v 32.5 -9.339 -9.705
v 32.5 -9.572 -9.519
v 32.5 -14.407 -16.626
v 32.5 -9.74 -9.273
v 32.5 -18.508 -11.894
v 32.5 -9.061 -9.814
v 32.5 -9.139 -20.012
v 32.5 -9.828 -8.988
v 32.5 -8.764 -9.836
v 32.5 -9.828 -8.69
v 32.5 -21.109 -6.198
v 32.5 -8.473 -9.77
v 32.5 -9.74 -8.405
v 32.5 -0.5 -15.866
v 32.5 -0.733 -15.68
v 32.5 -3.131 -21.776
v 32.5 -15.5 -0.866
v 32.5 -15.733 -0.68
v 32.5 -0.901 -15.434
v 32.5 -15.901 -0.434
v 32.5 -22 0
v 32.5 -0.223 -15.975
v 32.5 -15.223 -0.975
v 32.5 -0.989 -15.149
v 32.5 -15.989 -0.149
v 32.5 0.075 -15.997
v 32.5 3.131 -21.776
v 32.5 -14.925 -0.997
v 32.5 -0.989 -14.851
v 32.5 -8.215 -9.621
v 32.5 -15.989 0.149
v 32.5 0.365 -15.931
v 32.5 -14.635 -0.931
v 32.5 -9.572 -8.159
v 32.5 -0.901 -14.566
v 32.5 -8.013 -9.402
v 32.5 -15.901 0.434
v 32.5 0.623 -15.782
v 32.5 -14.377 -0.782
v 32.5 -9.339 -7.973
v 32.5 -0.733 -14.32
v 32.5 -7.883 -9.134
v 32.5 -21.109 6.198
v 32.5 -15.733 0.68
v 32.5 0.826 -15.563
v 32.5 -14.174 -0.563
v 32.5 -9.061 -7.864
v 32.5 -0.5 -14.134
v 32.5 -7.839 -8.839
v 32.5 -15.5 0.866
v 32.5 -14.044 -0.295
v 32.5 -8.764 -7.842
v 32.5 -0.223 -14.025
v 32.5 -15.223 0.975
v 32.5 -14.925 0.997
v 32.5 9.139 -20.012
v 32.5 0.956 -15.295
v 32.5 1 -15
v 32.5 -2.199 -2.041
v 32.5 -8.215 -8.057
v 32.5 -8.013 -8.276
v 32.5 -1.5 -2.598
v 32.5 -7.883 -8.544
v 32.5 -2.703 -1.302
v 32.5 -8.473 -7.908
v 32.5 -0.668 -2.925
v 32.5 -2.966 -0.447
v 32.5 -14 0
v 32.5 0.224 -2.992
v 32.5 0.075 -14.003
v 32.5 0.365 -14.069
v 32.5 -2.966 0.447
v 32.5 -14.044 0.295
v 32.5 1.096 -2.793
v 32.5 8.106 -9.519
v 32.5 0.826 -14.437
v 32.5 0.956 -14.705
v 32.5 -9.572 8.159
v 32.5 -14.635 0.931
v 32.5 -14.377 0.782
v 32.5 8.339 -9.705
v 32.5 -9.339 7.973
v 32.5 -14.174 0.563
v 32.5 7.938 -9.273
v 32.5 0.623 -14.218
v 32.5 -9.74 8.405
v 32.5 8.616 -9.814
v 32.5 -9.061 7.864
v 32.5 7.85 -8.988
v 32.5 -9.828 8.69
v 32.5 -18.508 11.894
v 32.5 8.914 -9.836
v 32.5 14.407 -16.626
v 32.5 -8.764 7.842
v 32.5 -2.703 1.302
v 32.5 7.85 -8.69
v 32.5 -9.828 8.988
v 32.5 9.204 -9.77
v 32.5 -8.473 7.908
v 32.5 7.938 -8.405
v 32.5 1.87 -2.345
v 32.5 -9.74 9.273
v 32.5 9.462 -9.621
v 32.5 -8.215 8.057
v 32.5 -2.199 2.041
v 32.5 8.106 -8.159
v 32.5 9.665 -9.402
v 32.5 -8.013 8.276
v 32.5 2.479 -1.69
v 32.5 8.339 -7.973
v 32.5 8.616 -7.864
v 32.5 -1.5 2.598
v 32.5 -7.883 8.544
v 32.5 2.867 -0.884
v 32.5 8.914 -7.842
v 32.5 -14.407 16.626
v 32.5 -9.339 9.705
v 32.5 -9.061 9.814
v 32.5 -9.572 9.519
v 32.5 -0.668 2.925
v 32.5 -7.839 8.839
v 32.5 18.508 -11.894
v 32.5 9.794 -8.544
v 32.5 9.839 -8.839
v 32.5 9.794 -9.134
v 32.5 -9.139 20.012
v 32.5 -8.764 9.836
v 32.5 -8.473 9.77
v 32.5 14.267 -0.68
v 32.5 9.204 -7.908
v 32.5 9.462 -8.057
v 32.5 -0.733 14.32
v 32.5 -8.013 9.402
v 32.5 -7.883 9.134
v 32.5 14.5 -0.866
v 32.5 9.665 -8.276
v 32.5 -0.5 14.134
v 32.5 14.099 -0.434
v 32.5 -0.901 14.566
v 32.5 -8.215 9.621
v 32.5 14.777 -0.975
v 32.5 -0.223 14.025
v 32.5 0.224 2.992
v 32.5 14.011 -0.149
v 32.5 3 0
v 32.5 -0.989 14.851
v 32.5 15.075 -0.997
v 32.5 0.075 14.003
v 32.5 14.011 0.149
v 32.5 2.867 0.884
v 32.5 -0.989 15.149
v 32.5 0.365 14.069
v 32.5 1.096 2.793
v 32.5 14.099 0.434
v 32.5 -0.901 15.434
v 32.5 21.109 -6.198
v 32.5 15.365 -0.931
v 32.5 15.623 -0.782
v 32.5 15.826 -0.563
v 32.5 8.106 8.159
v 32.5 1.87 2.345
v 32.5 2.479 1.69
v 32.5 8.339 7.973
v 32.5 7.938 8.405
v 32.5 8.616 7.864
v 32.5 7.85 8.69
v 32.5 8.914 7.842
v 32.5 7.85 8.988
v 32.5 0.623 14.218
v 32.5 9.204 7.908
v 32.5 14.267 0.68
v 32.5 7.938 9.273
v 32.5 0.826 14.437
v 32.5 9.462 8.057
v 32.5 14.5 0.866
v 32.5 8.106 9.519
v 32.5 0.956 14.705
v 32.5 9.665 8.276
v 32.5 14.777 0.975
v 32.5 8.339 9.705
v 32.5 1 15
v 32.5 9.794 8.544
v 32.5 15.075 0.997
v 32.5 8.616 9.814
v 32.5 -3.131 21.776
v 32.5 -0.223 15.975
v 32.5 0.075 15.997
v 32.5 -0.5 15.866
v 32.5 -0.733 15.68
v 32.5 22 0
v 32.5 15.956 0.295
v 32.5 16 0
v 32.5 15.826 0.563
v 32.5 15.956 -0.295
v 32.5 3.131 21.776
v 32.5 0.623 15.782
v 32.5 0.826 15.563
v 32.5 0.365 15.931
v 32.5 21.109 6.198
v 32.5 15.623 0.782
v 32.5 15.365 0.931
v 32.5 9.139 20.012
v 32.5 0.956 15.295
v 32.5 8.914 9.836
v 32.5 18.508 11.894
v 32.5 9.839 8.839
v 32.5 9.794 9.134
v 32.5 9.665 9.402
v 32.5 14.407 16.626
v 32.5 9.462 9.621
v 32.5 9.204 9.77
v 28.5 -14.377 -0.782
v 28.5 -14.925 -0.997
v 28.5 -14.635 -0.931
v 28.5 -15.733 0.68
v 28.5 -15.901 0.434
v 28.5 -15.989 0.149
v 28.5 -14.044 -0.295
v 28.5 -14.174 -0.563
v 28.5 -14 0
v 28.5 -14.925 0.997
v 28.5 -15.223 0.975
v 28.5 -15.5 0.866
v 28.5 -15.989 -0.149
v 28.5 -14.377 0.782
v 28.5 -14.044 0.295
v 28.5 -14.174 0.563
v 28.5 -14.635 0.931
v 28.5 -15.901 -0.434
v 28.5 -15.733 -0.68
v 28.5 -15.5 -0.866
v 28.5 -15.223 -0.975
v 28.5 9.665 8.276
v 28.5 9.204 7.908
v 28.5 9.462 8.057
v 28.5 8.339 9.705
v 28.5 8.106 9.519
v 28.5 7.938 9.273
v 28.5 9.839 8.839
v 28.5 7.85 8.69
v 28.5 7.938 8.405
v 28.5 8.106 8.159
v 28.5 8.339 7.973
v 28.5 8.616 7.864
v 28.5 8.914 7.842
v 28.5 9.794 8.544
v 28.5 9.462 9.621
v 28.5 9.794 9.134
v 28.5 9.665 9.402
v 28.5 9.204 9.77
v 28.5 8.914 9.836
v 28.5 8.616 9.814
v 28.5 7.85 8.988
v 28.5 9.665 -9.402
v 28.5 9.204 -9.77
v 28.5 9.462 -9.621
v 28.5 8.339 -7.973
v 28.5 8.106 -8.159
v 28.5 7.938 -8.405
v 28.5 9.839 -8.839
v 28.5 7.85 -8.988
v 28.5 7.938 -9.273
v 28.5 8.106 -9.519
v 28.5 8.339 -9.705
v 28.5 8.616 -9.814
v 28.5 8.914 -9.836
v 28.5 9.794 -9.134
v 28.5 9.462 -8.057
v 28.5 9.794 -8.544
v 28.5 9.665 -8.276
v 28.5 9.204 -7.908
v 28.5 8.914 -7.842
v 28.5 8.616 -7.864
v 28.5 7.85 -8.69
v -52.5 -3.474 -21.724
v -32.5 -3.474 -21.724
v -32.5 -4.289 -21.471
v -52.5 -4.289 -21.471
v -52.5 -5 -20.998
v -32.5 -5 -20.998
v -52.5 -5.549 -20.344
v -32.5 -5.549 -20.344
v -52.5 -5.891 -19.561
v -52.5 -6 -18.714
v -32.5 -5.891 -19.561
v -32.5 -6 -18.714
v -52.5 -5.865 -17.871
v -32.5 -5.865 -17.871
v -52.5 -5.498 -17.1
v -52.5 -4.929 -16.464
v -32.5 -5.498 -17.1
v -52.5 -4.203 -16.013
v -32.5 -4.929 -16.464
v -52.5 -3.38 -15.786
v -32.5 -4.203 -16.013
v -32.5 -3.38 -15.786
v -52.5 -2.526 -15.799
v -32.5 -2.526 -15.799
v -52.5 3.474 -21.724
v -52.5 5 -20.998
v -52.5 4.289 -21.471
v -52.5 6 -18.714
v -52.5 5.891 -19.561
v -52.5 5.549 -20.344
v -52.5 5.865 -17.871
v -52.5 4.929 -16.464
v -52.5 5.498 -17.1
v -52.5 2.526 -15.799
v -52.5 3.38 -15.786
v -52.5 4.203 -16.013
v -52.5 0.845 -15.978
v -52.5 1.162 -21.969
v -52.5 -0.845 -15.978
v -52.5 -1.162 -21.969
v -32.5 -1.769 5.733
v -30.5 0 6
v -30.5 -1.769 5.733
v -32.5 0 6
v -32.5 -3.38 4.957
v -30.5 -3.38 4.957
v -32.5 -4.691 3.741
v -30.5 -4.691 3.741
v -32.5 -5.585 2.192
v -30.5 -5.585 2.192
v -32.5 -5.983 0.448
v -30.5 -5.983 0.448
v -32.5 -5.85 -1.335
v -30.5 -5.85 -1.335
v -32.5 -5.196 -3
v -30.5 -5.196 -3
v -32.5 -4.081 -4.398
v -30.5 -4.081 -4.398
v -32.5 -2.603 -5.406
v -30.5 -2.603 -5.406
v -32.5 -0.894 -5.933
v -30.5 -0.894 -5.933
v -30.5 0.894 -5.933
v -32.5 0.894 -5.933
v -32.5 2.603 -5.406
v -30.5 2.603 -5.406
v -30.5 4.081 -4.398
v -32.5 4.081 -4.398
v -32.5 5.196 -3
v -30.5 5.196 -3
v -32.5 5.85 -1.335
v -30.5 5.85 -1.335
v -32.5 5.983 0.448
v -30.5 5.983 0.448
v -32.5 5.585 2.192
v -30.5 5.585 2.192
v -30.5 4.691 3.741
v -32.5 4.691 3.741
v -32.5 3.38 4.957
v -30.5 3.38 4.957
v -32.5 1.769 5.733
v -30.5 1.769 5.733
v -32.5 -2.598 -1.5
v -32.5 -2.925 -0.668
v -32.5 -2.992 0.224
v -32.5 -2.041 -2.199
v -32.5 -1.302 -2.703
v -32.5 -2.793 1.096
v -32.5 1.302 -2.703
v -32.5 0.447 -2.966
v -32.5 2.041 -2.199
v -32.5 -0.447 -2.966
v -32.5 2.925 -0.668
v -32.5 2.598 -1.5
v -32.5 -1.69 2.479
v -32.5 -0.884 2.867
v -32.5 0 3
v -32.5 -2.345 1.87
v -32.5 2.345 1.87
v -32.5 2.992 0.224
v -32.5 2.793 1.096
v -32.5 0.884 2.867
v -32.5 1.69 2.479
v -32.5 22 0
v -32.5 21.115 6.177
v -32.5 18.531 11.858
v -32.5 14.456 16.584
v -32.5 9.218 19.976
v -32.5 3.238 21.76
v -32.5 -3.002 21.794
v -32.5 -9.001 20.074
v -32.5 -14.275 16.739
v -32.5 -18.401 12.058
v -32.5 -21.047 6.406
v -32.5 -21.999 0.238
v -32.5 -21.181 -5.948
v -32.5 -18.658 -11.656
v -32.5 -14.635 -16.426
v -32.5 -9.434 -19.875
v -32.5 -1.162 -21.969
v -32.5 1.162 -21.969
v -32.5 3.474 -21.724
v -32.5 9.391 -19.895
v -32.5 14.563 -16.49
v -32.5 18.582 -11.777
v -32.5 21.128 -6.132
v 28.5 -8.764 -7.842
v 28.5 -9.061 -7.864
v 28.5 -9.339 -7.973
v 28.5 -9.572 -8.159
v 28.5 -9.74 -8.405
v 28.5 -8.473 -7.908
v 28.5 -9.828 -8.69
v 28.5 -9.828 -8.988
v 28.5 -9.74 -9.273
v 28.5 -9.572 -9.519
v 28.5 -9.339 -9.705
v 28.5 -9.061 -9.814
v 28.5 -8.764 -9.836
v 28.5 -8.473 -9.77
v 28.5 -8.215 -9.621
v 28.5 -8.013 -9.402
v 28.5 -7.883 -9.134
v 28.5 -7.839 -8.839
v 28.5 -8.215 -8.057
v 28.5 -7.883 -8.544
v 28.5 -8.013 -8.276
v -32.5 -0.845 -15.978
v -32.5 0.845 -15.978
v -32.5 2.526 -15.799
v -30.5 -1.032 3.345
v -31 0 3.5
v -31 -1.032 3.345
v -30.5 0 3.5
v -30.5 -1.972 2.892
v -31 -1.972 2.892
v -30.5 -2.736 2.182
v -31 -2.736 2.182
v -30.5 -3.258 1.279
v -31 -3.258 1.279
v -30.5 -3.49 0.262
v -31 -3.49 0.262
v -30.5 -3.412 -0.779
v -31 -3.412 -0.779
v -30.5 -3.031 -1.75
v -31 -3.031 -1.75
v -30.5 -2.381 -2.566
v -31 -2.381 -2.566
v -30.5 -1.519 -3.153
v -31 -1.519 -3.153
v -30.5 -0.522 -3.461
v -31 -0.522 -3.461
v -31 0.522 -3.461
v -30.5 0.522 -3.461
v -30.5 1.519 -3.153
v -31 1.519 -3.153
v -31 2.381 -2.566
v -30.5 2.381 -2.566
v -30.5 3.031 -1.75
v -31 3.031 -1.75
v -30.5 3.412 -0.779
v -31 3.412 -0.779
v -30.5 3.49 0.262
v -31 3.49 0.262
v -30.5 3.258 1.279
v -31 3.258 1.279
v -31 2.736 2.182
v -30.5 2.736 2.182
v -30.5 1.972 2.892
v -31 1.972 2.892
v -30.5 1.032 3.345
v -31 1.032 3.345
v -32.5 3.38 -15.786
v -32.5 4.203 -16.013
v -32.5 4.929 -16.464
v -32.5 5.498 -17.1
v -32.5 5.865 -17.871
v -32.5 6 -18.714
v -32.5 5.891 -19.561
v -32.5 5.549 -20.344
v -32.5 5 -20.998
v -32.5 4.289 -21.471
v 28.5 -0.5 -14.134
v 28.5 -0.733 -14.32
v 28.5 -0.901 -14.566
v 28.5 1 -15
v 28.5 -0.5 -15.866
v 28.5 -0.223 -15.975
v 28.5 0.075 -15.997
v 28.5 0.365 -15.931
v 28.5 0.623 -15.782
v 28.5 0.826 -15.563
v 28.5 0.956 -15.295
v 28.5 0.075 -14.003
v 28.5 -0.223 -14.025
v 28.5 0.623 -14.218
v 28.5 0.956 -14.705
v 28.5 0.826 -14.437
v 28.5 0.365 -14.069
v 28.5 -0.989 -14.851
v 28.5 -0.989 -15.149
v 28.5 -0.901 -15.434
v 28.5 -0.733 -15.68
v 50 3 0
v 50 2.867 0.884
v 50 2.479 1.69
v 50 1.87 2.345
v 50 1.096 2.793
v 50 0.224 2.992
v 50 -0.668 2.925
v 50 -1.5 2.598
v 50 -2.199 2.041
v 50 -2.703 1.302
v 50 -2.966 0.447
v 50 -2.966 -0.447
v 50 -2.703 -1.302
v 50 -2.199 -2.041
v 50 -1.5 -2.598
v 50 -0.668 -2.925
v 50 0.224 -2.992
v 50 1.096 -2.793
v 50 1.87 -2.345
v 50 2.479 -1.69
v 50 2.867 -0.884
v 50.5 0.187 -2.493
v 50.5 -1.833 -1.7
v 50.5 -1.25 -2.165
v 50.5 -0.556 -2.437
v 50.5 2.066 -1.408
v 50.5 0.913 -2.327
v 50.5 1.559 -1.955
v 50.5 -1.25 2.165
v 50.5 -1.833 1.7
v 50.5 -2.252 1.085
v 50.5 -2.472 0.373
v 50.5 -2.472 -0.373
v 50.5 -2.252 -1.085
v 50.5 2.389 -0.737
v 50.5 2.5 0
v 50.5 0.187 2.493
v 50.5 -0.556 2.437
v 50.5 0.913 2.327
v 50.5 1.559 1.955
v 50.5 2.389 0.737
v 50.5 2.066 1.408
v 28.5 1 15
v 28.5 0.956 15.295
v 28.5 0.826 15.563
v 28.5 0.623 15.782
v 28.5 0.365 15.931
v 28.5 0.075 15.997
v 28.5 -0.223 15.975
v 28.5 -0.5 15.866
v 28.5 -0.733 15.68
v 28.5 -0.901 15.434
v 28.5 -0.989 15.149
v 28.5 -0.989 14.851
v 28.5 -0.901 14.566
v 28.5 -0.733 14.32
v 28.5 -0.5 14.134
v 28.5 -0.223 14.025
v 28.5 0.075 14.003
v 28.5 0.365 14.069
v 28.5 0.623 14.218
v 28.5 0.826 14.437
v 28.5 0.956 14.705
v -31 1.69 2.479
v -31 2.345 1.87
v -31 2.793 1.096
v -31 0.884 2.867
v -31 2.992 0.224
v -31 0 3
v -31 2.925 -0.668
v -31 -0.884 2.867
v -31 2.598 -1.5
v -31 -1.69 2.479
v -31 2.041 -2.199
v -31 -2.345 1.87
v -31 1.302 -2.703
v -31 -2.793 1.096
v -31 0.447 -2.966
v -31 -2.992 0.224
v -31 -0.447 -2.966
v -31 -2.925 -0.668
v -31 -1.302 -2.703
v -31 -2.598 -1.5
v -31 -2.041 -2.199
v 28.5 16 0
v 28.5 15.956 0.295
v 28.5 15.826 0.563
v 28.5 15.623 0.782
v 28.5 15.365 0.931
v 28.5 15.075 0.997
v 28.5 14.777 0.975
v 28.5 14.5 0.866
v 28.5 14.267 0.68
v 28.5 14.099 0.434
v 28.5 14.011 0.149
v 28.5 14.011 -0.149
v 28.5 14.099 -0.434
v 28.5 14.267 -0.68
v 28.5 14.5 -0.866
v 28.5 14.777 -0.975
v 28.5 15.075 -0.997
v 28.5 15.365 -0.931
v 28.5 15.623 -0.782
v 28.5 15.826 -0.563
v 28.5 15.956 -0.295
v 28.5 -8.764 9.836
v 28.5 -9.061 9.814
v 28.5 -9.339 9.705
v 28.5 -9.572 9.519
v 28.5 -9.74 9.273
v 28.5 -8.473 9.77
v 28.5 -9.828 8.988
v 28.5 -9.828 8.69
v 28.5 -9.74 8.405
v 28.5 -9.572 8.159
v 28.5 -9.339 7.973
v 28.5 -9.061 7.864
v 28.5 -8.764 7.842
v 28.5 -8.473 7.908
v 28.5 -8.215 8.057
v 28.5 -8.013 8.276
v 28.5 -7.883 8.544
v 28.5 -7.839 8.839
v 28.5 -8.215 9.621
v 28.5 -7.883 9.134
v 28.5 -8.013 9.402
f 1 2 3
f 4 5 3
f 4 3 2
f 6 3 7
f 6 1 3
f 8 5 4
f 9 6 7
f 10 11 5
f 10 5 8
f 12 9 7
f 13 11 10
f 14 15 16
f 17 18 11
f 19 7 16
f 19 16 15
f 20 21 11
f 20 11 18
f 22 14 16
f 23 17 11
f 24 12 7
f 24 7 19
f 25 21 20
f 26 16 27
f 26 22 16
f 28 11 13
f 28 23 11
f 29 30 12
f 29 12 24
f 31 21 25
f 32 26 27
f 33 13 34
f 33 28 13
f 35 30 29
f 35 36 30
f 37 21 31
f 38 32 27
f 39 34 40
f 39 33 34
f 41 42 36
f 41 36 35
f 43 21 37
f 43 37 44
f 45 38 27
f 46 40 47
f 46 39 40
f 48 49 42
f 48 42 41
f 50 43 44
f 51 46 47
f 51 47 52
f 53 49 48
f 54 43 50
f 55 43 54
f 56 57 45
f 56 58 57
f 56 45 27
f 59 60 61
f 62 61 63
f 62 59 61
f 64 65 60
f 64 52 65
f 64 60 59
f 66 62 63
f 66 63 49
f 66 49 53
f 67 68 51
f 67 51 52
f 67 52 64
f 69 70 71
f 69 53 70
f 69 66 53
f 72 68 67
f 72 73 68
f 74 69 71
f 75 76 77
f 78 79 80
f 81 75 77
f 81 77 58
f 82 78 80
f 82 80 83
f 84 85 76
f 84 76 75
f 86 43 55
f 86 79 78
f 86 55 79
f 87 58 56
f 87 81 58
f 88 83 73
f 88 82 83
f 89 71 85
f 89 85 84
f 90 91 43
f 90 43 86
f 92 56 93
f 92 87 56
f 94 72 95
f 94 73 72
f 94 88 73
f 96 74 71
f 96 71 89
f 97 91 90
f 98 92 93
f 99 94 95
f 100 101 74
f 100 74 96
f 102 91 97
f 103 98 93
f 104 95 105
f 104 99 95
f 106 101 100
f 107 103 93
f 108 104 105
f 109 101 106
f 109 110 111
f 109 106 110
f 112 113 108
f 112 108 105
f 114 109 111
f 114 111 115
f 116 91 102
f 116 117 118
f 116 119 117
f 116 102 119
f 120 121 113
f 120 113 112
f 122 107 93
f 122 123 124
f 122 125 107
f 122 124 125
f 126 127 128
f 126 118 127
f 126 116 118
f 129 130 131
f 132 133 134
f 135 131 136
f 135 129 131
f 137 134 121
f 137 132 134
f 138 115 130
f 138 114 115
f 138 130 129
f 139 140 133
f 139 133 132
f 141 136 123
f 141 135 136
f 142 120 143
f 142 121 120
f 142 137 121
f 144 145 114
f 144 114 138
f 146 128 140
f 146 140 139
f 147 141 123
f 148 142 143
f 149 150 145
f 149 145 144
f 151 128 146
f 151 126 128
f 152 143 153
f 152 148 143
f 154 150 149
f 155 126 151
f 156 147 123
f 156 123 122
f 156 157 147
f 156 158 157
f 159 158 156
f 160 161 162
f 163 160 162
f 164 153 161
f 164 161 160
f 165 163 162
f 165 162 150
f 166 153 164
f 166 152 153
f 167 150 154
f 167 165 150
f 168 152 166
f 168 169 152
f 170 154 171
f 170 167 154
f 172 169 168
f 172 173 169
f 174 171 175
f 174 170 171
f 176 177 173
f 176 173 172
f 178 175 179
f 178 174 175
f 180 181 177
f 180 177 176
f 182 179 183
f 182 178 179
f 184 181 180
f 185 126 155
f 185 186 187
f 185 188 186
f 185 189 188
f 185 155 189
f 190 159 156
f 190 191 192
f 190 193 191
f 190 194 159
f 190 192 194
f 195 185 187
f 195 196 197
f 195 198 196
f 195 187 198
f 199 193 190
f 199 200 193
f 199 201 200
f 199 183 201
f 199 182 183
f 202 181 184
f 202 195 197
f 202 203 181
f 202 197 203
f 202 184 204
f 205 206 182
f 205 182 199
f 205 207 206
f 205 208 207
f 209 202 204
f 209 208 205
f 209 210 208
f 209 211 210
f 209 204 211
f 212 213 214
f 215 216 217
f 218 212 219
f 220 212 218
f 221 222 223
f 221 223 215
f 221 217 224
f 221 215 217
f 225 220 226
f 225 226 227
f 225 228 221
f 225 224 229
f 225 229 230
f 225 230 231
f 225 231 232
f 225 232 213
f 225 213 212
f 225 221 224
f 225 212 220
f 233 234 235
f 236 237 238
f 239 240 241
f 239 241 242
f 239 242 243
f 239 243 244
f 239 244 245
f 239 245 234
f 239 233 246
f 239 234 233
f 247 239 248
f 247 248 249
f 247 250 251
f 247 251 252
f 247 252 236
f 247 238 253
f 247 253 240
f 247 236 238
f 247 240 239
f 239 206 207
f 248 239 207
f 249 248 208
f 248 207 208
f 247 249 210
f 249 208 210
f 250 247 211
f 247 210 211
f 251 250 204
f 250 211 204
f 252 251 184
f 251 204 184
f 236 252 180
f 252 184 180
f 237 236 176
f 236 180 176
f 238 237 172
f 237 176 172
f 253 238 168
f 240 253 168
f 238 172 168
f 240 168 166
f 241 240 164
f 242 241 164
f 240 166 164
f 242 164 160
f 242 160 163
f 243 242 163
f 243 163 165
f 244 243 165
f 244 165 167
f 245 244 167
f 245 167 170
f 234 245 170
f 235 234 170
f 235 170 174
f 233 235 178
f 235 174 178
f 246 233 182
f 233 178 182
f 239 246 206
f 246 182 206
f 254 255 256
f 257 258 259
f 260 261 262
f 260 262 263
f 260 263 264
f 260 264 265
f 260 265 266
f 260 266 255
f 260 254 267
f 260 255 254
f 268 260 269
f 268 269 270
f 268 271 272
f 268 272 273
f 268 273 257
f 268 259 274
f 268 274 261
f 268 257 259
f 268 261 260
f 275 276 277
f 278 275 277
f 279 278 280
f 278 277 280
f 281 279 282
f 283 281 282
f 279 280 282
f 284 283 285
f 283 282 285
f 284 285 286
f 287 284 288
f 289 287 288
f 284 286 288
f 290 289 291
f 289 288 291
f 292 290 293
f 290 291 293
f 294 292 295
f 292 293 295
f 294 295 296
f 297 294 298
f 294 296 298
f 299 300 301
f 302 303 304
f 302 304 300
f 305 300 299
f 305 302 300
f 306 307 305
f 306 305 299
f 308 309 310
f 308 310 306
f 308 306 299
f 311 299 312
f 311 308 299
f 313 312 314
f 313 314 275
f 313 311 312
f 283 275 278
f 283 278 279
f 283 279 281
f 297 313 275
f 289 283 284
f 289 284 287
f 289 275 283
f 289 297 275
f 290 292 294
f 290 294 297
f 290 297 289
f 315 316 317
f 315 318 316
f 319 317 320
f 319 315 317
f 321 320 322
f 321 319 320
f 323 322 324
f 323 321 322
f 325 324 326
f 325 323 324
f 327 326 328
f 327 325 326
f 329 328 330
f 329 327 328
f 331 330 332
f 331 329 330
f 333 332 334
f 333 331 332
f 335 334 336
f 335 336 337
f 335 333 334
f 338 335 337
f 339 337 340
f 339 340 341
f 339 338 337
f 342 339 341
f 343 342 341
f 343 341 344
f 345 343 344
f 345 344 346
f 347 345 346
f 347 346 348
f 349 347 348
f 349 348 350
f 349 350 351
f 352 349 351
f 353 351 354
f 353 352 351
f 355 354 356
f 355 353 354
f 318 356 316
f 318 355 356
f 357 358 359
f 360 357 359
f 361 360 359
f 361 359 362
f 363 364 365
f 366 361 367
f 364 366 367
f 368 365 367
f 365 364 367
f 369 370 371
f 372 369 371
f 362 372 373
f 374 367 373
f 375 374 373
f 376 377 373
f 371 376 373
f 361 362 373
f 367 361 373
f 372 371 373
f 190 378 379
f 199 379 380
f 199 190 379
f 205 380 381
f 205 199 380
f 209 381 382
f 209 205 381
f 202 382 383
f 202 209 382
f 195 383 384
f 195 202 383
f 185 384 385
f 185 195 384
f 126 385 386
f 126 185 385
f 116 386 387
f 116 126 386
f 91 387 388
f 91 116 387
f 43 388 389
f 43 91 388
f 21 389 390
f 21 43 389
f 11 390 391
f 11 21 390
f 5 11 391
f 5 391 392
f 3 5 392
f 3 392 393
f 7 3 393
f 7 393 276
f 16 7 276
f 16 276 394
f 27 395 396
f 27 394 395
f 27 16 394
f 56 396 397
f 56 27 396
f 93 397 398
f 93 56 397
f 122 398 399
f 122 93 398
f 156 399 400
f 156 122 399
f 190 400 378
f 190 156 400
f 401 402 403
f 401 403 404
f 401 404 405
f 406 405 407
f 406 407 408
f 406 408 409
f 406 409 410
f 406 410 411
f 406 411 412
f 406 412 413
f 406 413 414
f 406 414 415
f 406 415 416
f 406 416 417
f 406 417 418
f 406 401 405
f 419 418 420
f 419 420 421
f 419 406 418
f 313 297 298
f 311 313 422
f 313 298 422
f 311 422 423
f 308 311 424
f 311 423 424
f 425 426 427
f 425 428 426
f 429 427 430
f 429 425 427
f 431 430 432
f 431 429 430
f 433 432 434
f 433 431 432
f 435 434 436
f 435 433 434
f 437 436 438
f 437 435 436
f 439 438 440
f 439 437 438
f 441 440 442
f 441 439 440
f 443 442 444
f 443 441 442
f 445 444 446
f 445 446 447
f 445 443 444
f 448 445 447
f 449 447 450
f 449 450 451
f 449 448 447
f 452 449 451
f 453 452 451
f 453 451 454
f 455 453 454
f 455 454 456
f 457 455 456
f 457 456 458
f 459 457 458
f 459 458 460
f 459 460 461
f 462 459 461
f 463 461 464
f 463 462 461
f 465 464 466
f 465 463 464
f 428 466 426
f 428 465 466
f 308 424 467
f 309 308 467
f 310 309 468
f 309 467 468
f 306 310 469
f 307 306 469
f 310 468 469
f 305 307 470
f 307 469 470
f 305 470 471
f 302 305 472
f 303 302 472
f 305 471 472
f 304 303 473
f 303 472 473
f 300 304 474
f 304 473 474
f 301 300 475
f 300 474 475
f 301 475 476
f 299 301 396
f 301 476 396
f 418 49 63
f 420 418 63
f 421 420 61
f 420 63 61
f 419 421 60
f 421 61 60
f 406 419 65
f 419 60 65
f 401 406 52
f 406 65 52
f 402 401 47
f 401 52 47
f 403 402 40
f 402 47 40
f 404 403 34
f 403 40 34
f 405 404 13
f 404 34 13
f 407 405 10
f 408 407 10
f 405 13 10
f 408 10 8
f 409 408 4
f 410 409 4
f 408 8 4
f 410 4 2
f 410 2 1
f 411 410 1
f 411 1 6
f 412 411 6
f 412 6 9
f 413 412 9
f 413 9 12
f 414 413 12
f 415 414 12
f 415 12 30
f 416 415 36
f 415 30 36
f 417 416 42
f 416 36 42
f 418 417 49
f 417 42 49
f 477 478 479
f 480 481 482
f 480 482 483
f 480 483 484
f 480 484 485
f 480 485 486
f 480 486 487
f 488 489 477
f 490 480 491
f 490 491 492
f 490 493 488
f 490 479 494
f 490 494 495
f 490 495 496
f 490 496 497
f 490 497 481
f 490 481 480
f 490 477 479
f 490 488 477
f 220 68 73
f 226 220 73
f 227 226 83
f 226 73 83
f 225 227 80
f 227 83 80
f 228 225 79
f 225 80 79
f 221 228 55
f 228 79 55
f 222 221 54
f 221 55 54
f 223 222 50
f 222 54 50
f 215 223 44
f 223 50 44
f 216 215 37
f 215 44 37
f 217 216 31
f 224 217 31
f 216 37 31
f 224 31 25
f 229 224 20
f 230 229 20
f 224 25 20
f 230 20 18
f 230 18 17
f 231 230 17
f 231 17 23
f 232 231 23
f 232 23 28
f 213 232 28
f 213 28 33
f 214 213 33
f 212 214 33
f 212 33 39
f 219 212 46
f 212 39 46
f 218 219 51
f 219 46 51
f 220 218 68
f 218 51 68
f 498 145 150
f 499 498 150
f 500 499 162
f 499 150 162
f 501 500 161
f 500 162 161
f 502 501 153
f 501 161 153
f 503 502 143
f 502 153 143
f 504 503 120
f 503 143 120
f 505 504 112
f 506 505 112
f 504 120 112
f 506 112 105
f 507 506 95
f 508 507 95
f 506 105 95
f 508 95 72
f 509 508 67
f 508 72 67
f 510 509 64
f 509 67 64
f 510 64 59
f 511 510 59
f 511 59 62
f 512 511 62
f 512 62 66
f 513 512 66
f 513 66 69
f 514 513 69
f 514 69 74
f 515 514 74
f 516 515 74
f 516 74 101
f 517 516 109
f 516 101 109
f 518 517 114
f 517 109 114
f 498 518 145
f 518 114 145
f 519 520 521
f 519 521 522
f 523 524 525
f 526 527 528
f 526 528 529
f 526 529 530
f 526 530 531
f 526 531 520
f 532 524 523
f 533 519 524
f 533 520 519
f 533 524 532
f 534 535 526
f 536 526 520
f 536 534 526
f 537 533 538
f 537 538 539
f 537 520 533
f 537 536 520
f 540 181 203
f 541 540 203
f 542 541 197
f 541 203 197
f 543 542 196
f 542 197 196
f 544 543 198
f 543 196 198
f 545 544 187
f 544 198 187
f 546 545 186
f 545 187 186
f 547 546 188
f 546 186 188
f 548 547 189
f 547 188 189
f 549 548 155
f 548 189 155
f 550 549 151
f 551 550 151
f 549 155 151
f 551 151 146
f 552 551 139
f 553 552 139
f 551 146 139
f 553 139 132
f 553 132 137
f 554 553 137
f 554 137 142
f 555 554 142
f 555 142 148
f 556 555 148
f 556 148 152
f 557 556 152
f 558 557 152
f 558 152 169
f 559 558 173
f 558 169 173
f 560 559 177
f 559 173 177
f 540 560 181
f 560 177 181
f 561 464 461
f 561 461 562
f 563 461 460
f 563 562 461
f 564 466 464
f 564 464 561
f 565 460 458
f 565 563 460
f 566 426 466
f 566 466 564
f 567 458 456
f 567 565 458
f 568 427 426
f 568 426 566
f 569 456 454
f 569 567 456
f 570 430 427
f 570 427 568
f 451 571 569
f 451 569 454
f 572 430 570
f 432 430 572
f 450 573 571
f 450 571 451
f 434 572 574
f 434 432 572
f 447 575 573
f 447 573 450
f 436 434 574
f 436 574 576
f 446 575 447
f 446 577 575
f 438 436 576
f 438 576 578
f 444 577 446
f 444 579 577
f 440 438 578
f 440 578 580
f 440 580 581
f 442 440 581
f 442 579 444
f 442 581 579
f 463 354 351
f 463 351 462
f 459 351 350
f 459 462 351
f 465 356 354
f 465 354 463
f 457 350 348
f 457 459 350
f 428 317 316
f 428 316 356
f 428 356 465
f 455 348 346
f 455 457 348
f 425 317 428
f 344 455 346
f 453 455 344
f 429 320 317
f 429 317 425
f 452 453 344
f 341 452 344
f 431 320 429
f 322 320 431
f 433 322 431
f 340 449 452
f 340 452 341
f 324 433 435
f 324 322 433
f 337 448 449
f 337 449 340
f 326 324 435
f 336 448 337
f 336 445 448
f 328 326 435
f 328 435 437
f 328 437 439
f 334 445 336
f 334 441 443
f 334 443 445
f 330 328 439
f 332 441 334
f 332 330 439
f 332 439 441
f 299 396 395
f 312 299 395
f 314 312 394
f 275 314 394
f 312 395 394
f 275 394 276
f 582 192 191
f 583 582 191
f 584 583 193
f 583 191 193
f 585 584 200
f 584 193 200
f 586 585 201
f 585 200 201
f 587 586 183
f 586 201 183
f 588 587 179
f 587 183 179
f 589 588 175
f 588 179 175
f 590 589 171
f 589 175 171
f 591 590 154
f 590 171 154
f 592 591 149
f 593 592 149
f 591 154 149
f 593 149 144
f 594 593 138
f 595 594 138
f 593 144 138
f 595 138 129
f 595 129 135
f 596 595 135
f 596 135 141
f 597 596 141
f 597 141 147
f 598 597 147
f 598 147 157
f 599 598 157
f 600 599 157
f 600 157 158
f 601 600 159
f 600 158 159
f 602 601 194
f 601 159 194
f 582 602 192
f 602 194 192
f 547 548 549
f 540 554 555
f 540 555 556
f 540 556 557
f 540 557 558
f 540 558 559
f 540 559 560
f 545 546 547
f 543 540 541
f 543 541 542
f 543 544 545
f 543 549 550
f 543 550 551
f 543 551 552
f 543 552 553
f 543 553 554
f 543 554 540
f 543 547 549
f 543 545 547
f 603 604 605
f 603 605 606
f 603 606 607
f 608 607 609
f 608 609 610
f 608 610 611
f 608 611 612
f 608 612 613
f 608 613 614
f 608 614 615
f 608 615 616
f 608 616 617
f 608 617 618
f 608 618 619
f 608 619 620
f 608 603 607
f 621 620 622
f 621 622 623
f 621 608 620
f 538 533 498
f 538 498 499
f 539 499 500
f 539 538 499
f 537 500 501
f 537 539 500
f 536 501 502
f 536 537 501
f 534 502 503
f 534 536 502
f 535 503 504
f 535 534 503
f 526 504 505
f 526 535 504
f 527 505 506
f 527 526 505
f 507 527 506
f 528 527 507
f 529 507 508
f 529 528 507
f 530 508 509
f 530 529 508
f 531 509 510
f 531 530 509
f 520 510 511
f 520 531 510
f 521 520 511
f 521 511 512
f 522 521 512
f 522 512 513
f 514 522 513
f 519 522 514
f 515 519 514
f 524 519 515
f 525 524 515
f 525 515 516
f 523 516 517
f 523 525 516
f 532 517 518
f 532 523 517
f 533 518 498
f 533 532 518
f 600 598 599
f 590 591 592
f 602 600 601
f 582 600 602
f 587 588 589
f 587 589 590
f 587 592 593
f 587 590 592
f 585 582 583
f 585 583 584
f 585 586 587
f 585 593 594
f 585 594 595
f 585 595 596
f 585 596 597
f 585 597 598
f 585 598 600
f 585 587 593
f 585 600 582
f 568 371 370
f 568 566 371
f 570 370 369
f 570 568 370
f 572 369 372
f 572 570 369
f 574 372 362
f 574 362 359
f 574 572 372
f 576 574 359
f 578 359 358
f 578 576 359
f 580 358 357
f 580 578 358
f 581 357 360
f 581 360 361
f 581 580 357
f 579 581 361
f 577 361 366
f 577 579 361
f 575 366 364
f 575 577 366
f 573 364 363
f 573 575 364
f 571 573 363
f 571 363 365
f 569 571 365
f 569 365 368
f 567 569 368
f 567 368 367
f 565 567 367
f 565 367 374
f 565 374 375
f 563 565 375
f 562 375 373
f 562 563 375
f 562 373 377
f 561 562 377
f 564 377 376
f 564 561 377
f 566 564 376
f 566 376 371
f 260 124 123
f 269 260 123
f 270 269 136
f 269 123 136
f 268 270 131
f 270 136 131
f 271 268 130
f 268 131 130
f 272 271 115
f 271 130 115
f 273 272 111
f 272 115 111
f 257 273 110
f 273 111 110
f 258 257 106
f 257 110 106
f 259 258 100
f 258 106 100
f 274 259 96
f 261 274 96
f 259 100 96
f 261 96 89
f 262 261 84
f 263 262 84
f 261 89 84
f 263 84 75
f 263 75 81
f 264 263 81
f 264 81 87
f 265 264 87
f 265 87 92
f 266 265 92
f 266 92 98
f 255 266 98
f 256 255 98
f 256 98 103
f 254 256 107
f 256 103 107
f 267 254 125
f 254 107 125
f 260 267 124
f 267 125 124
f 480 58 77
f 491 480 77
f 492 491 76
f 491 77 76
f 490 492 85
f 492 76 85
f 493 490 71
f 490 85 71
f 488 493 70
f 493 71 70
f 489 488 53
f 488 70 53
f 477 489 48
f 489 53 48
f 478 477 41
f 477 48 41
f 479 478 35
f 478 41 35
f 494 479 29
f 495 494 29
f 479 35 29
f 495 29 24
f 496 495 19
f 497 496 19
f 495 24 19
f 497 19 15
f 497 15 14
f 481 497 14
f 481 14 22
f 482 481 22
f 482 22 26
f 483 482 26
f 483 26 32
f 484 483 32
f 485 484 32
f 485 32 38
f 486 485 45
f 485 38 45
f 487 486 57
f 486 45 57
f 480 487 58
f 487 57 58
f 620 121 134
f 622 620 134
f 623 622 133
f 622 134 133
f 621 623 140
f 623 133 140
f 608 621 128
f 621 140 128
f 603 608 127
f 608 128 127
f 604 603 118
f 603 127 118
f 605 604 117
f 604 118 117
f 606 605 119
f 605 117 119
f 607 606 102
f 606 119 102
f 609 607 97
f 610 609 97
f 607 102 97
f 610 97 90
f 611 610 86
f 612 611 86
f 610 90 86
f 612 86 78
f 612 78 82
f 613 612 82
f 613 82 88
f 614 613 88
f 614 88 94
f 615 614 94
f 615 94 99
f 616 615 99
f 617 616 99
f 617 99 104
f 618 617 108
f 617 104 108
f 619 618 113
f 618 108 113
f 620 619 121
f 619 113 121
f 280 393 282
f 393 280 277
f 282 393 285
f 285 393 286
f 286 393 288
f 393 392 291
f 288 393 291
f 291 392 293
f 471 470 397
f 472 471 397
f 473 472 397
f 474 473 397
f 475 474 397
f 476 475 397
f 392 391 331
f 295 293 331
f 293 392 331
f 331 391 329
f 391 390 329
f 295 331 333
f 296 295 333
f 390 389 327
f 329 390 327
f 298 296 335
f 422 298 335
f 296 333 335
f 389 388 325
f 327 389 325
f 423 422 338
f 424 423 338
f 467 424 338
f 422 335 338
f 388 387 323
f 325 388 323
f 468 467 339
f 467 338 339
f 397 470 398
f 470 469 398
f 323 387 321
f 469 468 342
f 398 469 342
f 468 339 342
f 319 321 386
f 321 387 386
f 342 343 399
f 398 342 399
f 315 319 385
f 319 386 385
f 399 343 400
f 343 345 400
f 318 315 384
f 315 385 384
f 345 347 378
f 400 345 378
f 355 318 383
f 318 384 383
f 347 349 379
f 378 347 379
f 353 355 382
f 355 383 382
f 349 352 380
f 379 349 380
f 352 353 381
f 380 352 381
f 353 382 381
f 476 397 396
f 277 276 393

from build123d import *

# Parameters (mm, degrees)
F0_R     = 22
F1_DEPTH = 32.5
F2_R     = 3
F3_DEPTH = 18
F4_R     = 1
F5_DEPTH = 4
F9_DEPTH = 20
F10_SIZE = 0.5


with BuildPart() as f1:
    # F0 (on Right) → F1 (new body, symmetric)
    with BuildSketch(Plane.YZ):
        Circle(F0_R)
    extrude(amount=F1_DEPTH, both=True)

    # F2 (on face) → F3 (join)
    with BuildSketch(Plane.YZ.offset(32.5)):
        Circle(F2_R)
    extrude(amount=F3_DEPTH)

    # F4 (on face) → F5 (cut)
    with BuildSketch(Plane.YZ.offset(32.5)):
        with Locations((0, 15)):
            Circle(F4_R)
        with Locations((-15, 0)):
            Circle(F4_R)
        with Locations((0, -15)):
            Circle(F4_R)
        with Locations((15, 0)):
            Circle(F4_R)
        with Locations((-8.838835, 8.838835)):
            Circle(F4_R)
        with Locations((-8.838835, -8.838835)):
            Circle(F4_R)
        with Locations((8.838835, -8.838835)):
            Circle(F4_R)
        with Locations((8.838835, 8.838835)):
            Circle(F4_R)
    extrude(amount=-F5_DEPTH, mode=Mode.SUBTRACT)

    # F6 (on Front) → F7 (revolve, cut)
    with BuildSketch(Plane.XZ):
        Polygon((-32.5, 6), (-32.5, 3), (-31, 3), (-31, 3.5), (-30.5, 3.5), (-30.5, 6), align=None)
    revolve(axis=Axis((7.880477, 0, 0), (1, 0, 0)), mode=Mode.SUBTRACT)

    # F8 (on face) → F9 (join)
    with BuildSketch(Plane(origin=(-32.5, 0, 0), x_dir=(0, -1, 0), z_dir=(-1, 0, 0))):
        with BuildLine():
            ThreePointArc((-3.473684, -21.724031), (0, -22), (3.473684, -21.724031))
            ThreePointArc((3.473684, -21.724031), (5.962368, -18.287979), (2.526316, -15.799295))
            ThreePointArc((2.526316, -15.799295), (0, -16), (-2.526316, -15.799295))
            ThreePointArc((-2.526316, -15.799295), (-5.962368, -18.287979), (-3.473684, -21.724031))
        make_face()
    extrude(amount=F9_DEPTH)

    # F10
    f10_edges = [f1.edges().sort_by_distance(p)[0] for p in [
        (50.5, -3, 0),
    ]]
    chamfer(f10_edges, length=F10_SIZE)


solid = f1.part
